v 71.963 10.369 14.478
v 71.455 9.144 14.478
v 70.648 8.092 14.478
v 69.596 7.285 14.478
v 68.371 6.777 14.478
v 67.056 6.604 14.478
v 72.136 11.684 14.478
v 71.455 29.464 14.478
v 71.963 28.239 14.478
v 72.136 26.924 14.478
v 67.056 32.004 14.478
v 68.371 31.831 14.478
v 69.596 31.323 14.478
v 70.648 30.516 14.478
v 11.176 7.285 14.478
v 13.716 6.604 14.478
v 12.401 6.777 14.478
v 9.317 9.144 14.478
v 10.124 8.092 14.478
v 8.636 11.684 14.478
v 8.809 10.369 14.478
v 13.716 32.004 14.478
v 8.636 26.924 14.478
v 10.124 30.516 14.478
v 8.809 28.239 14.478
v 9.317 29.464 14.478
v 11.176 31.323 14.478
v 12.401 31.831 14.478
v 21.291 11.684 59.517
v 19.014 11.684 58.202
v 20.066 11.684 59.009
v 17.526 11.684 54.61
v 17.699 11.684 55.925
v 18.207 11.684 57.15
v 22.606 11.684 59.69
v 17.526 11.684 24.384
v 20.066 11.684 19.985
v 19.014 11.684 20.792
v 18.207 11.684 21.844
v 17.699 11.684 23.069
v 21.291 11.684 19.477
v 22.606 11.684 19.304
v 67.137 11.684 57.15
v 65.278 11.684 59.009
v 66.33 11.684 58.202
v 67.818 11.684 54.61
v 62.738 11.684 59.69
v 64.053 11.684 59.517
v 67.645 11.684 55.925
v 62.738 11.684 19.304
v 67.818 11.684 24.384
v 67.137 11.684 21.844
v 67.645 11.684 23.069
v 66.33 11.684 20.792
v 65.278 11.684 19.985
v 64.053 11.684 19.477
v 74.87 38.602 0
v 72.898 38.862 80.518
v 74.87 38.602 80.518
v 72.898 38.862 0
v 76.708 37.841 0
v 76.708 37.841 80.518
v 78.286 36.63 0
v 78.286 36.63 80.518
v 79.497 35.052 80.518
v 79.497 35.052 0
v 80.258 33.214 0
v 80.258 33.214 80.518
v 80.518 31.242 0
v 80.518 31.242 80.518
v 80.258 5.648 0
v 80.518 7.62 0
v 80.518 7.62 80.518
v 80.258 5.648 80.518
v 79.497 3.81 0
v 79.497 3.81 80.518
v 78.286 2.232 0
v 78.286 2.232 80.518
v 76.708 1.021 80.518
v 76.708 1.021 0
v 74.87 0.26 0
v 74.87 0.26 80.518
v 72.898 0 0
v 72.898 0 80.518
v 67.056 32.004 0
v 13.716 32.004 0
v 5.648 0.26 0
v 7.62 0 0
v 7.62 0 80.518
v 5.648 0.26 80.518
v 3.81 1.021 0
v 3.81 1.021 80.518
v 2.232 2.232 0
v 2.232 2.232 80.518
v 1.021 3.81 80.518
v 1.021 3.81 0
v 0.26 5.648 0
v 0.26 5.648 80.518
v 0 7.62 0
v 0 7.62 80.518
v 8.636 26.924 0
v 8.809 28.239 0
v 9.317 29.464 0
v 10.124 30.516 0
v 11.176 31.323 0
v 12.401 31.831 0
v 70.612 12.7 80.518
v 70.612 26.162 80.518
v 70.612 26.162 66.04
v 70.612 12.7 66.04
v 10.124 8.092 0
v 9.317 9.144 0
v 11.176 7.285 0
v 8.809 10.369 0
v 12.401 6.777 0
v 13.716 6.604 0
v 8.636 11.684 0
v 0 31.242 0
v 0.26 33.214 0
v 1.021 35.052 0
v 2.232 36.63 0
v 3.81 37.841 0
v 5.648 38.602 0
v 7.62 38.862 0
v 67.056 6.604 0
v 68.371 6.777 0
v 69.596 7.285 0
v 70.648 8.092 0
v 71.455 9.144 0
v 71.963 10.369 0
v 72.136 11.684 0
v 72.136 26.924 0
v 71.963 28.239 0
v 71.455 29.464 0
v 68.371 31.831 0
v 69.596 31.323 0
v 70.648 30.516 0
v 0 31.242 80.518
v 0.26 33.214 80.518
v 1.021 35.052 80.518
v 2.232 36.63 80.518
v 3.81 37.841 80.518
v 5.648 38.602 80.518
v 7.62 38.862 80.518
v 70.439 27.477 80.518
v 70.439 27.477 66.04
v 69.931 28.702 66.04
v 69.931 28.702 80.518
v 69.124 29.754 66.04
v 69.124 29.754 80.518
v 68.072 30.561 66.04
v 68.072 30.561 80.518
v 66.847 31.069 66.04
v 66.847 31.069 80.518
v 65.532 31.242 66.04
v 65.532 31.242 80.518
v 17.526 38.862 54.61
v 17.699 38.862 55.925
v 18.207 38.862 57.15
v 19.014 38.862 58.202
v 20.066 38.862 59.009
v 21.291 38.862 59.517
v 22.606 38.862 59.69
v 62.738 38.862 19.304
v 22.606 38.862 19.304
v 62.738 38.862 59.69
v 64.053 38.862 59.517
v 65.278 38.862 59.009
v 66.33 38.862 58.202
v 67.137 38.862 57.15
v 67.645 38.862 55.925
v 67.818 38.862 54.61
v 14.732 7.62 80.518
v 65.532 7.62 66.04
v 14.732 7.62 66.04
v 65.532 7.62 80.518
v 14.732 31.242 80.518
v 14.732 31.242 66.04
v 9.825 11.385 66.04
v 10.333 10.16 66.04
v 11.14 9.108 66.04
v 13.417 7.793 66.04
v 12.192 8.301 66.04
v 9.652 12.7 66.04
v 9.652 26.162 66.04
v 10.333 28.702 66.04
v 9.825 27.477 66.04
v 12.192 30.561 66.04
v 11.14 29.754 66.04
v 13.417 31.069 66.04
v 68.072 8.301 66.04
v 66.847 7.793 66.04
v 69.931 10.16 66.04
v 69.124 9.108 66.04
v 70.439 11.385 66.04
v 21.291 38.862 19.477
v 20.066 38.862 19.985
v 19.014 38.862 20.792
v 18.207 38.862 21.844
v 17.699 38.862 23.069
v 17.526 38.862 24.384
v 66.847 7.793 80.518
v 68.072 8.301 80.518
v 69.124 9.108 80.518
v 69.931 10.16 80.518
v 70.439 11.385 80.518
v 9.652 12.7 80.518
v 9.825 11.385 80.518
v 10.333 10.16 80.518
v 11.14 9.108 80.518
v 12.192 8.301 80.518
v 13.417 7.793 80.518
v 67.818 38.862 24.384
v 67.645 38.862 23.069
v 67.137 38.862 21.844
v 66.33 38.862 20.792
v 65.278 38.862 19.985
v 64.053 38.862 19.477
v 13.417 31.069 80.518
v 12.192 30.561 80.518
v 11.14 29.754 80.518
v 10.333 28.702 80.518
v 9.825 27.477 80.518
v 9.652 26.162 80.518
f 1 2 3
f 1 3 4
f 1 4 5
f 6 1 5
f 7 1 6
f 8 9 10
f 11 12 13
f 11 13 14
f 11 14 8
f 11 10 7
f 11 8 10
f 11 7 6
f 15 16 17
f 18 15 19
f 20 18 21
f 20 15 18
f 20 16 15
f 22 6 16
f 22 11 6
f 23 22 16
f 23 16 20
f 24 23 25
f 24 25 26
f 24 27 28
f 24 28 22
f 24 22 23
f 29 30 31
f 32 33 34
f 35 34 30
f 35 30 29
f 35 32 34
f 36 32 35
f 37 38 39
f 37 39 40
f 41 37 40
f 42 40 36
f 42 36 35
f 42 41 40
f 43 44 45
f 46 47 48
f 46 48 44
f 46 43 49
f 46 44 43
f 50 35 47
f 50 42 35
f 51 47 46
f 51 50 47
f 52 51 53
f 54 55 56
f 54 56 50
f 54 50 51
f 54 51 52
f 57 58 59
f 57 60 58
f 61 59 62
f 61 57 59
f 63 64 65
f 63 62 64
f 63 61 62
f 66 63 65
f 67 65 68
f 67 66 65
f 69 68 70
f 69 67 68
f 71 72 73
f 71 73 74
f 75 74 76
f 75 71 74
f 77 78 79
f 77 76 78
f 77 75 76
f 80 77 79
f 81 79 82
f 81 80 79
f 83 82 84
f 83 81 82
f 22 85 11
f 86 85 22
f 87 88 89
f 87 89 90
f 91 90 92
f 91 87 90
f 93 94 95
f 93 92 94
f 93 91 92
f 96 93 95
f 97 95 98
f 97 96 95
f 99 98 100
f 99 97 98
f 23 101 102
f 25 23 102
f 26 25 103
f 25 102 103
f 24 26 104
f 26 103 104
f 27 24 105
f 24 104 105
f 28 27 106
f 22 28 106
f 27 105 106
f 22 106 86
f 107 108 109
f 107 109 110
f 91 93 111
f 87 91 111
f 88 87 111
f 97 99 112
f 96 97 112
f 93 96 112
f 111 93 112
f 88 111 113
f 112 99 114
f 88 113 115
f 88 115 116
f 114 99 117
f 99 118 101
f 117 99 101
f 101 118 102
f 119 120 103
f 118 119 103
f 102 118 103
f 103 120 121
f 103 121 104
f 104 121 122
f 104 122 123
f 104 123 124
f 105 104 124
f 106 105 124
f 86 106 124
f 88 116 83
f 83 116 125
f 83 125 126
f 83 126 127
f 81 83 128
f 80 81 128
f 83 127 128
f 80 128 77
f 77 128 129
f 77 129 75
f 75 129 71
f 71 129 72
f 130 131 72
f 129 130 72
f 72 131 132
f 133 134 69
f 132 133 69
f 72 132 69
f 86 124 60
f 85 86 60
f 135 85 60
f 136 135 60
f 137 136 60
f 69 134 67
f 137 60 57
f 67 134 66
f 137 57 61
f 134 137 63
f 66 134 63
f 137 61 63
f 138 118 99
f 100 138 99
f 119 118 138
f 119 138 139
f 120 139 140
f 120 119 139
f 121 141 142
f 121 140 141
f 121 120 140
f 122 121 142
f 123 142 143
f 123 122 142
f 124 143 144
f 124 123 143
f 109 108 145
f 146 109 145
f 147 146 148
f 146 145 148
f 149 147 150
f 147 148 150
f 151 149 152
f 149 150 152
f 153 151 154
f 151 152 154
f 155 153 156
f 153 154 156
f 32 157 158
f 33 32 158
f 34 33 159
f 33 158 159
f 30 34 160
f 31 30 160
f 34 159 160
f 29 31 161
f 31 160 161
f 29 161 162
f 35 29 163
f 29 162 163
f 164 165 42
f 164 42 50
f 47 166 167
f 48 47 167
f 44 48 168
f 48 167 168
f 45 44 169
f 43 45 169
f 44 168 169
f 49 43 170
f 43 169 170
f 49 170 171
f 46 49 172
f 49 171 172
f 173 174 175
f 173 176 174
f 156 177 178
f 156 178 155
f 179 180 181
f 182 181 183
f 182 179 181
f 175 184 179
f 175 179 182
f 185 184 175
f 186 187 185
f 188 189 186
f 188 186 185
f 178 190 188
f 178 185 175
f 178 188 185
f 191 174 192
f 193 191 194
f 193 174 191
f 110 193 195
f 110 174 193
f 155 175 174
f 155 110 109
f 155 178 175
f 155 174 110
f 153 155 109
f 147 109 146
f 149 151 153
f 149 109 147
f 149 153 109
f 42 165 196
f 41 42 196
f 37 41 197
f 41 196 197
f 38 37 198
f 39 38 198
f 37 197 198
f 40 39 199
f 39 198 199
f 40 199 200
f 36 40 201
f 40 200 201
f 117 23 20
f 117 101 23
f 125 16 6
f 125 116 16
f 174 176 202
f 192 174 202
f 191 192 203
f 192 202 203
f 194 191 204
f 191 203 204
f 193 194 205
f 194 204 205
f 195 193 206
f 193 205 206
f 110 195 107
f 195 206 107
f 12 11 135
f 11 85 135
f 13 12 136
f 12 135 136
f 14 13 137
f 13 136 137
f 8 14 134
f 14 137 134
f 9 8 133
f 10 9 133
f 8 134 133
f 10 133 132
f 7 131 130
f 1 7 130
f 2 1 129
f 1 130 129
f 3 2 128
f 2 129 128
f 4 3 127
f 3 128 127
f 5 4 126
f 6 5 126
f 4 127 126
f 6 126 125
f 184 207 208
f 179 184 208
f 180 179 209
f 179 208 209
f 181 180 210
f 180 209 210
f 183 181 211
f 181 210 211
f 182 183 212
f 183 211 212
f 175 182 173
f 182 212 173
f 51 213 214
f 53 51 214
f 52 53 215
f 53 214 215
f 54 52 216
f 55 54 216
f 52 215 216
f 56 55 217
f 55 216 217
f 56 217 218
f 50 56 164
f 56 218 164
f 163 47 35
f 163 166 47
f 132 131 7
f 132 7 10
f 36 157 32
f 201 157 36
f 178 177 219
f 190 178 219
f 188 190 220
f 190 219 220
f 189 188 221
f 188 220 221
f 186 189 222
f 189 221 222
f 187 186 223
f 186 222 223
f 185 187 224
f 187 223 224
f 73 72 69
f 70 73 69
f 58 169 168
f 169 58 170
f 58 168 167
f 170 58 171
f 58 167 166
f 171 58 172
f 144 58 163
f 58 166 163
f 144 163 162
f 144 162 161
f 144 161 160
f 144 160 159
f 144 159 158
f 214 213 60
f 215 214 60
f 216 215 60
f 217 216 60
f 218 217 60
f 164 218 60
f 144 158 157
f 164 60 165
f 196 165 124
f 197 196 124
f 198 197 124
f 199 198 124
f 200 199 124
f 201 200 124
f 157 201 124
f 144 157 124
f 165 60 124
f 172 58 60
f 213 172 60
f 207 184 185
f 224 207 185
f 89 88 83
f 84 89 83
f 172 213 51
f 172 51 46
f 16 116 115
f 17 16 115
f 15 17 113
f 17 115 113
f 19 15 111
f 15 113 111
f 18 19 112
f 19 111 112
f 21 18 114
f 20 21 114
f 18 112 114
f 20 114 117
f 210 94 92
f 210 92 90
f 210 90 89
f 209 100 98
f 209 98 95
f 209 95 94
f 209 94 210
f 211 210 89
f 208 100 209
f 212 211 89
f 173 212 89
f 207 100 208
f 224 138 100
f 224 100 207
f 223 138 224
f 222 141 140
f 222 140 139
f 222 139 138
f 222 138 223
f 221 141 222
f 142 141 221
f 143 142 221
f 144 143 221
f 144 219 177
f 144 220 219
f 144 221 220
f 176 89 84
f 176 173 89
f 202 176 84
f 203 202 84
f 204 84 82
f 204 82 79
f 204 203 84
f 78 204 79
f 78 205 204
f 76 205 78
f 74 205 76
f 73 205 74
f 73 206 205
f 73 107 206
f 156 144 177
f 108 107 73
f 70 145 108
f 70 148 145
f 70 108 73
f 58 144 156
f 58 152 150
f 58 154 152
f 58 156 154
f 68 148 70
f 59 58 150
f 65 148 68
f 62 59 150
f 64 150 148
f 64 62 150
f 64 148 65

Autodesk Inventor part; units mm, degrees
ref_plane "YZ Plane" through (0, 0, 0) normal (1, 0, 0) x (0, 1, 0)
ref_plane "XZ Plane" through (0, 0, 0) normal (0, 1, 0) x (-1, 0, 0)
ref_plane "XY Plane" through (0, 0, 0) normal (0, 0, 1) x (1, 0, 0)
sketch "Sketch1" plane through (0, 0, 0) normal (0, 0, 1) x (1, 0, 0)
  line L0 (7.62, 0) -> (72.898, 0)
  line L1 (80.518, 7.62) -> (80.518, 31.242)
  line L2 (72.898, 38.862) -> (7.62, 38.862)
  line L3 (0, 31.242) -> (0, 7.62)
  arc A0 (7.62, 38.862) -> (0, 31.242) centre (7.62, 31.242) ccw
  arc A1 (80.518, 31.242) -> (72.898, 38.862) centre (72.898, 31.242) ccw
  arc A2 (72.898, 0) -> (80.518, 7.62) centre (72.898, 7.62) ccw
  arc A3 (0, 7.62) -> (7.62, 0) centre (7.62, 7.62) ccw
  point P0 (0, 0)
  point P1 (80.518, 38.862)
  point P2 (80.518, 0)
  point P3 (0, 38.862)
  dimension "d0" = 80.518
  dimension "d1" = 38.862
  dimension "d2" = 7.62
  dimension "d3" = 7.62
  dimension "d4" = 7.62
  dimension "d5" = 7.62
extrude "Extrusion1" add sketch "Sketch1" along normal blind 80.518
sketch "Sketch2" plane through (7.62, 38.862, 0) normal (0, 1, 0) x (1, 0, 0)
  line L0 (14.986, -19.304) -> (55.118, -19.304)
  line L1 (60.198, -24.384) -> (60.198, -54.61)
  line L2 (55.118, -59.69) -> (14.986, -59.69)
  line L3 (9.906, -54.61) -> (9.906, -24.384)
  line L4 (65.278, -80.518) -> (0, -80.518) projected
  line L5 (72.898, 0) -> (72.898, -80.518) projected
  arc A0 (14.986, -19.304) -> (9.906, -24.384) centre (14.986, -24.384) ccw
  arc A1 (60.198, -24.384) -> (55.118, -19.304) centre (55.118, -24.384) ccw
  arc A2 (55.118, -59.69) -> (60.198, -54.61) centre (55.118, -54.61) ccw
  arc A3 (9.906, -54.61) -> (14.986, -59.69) centre (14.986, -54.61) ccw
  point P0 (-7.62, 0)
  point P1 (9.906, -19.304)
  point P2 (60.198, -19.304)
  point P3 (9.906, -59.69)
  dimension "d16" = 40.386
  dimension "d17" = 50.292
  dimension "d18" = 20.828
  dimension "d19" = 12.7
  dimension "d20" = 5.08
  dimension "d21" = 5.08
  dimension "d22" = 5.08
  dimension "d23" = 5.08
extrude "Extrusion2" cut sketch "Sketch2" against normal blind 27.178
sketch "Sketch3" plane through (0, 0, 80.518) normal (0, 0, 1) x (1, 0, 0)
  line L0 (14.732, 31.242) -> (65.532, 31.242)
  line L1 (70.612, 26.162) -> (70.612, 12.7)
  line L2 (65.532, 7.62) -> (14.732, 7.62)
  line L3 (9.652, 12.7) -> (9.652, 26.162)
  line L4 (80.518, 7.62) -> (80.518, 31.242) projected
  line L5 (72.898, 38.862) -> (7.62, 38.862) projected
  arc A0 (70.612, 26.162) -> (65.532, 31.242) centre (65.532, 26.162) ccw
  arc A1 (65.532, 7.62) -> (70.612, 12.7) centre (65.532, 12.7) ccw
  arc A2 (9.652, 12.7) -> (14.732, 7.62) centre (14.732, 12.7) ccw
  arc A3 (14.732, 31.242) -> (9.652, 26.162) centre (14.732, 26.162) ccw
  point P0 (0, 0)
  point P1 (9.652, 31.242)
  point P2 (70.612, 31.242)
  point P3 (9.652, 7.62)
  dimension "d26" = 60.96
  dimension "d27" = 9.906
  dimension "d28" = 23.622
  dimension "d29" = 7.62
  dimension "d30" = 5.08
  dimension "d31" = 5.08
extrude "Extrusion3" cut sketch "Sketch3" against normal blind 14.478
sketch "Sketch4" plane through (0, 0, 0) normal (0, 0, -1) x (-1, 0, 0)
  line L0 (-67.056, 32.004) -> (-13.716, 32.004)
  line L1 (-8.636, 26.924) -> (-8.636, 11.684)
  line L2 (-13.716, 6.604) -> (-67.056, 6.604)
  line L3 (-72.136, 11.684) -> (-72.136, 26.924)
  line L4 (0, 7.62) -> (0, 31.242) projected
  line L5 (-7.62, 38.862) -> (-72.898, 38.862) projected
  arc A0 (-67.056, 32.004) -> (-72.136, 26.924) centre (-67.056, 26.924) ccw
  arc A1 (-8.636, 26.924) -> (-13.716, 32.004) centre (-13.716, 26.924) ccw
  arc A2 (-13.716, 6.604) -> (-8.636, 11.684) centre (-13.716, 11.684) ccw
  arc A3 (-72.136, 11.684) -> (-67.056, 6.604) centre (-67.056, 11.684) ccw
  point P0 (0, 0)
  point P1 (-72.136, 32.004)
  point P2 (-8.636, 6.604)
  point P3 (-8.636, 32.004)
  dimension "d34" = 63.5
  dimension "d35" = 25.4
  dimension "d36" = 8.636
  dimension "d37" = 6.858
  dimension "d38" = 5.08
extrude "Extrusion4" cut sketch "Sketch4" against normal blind 14.478
